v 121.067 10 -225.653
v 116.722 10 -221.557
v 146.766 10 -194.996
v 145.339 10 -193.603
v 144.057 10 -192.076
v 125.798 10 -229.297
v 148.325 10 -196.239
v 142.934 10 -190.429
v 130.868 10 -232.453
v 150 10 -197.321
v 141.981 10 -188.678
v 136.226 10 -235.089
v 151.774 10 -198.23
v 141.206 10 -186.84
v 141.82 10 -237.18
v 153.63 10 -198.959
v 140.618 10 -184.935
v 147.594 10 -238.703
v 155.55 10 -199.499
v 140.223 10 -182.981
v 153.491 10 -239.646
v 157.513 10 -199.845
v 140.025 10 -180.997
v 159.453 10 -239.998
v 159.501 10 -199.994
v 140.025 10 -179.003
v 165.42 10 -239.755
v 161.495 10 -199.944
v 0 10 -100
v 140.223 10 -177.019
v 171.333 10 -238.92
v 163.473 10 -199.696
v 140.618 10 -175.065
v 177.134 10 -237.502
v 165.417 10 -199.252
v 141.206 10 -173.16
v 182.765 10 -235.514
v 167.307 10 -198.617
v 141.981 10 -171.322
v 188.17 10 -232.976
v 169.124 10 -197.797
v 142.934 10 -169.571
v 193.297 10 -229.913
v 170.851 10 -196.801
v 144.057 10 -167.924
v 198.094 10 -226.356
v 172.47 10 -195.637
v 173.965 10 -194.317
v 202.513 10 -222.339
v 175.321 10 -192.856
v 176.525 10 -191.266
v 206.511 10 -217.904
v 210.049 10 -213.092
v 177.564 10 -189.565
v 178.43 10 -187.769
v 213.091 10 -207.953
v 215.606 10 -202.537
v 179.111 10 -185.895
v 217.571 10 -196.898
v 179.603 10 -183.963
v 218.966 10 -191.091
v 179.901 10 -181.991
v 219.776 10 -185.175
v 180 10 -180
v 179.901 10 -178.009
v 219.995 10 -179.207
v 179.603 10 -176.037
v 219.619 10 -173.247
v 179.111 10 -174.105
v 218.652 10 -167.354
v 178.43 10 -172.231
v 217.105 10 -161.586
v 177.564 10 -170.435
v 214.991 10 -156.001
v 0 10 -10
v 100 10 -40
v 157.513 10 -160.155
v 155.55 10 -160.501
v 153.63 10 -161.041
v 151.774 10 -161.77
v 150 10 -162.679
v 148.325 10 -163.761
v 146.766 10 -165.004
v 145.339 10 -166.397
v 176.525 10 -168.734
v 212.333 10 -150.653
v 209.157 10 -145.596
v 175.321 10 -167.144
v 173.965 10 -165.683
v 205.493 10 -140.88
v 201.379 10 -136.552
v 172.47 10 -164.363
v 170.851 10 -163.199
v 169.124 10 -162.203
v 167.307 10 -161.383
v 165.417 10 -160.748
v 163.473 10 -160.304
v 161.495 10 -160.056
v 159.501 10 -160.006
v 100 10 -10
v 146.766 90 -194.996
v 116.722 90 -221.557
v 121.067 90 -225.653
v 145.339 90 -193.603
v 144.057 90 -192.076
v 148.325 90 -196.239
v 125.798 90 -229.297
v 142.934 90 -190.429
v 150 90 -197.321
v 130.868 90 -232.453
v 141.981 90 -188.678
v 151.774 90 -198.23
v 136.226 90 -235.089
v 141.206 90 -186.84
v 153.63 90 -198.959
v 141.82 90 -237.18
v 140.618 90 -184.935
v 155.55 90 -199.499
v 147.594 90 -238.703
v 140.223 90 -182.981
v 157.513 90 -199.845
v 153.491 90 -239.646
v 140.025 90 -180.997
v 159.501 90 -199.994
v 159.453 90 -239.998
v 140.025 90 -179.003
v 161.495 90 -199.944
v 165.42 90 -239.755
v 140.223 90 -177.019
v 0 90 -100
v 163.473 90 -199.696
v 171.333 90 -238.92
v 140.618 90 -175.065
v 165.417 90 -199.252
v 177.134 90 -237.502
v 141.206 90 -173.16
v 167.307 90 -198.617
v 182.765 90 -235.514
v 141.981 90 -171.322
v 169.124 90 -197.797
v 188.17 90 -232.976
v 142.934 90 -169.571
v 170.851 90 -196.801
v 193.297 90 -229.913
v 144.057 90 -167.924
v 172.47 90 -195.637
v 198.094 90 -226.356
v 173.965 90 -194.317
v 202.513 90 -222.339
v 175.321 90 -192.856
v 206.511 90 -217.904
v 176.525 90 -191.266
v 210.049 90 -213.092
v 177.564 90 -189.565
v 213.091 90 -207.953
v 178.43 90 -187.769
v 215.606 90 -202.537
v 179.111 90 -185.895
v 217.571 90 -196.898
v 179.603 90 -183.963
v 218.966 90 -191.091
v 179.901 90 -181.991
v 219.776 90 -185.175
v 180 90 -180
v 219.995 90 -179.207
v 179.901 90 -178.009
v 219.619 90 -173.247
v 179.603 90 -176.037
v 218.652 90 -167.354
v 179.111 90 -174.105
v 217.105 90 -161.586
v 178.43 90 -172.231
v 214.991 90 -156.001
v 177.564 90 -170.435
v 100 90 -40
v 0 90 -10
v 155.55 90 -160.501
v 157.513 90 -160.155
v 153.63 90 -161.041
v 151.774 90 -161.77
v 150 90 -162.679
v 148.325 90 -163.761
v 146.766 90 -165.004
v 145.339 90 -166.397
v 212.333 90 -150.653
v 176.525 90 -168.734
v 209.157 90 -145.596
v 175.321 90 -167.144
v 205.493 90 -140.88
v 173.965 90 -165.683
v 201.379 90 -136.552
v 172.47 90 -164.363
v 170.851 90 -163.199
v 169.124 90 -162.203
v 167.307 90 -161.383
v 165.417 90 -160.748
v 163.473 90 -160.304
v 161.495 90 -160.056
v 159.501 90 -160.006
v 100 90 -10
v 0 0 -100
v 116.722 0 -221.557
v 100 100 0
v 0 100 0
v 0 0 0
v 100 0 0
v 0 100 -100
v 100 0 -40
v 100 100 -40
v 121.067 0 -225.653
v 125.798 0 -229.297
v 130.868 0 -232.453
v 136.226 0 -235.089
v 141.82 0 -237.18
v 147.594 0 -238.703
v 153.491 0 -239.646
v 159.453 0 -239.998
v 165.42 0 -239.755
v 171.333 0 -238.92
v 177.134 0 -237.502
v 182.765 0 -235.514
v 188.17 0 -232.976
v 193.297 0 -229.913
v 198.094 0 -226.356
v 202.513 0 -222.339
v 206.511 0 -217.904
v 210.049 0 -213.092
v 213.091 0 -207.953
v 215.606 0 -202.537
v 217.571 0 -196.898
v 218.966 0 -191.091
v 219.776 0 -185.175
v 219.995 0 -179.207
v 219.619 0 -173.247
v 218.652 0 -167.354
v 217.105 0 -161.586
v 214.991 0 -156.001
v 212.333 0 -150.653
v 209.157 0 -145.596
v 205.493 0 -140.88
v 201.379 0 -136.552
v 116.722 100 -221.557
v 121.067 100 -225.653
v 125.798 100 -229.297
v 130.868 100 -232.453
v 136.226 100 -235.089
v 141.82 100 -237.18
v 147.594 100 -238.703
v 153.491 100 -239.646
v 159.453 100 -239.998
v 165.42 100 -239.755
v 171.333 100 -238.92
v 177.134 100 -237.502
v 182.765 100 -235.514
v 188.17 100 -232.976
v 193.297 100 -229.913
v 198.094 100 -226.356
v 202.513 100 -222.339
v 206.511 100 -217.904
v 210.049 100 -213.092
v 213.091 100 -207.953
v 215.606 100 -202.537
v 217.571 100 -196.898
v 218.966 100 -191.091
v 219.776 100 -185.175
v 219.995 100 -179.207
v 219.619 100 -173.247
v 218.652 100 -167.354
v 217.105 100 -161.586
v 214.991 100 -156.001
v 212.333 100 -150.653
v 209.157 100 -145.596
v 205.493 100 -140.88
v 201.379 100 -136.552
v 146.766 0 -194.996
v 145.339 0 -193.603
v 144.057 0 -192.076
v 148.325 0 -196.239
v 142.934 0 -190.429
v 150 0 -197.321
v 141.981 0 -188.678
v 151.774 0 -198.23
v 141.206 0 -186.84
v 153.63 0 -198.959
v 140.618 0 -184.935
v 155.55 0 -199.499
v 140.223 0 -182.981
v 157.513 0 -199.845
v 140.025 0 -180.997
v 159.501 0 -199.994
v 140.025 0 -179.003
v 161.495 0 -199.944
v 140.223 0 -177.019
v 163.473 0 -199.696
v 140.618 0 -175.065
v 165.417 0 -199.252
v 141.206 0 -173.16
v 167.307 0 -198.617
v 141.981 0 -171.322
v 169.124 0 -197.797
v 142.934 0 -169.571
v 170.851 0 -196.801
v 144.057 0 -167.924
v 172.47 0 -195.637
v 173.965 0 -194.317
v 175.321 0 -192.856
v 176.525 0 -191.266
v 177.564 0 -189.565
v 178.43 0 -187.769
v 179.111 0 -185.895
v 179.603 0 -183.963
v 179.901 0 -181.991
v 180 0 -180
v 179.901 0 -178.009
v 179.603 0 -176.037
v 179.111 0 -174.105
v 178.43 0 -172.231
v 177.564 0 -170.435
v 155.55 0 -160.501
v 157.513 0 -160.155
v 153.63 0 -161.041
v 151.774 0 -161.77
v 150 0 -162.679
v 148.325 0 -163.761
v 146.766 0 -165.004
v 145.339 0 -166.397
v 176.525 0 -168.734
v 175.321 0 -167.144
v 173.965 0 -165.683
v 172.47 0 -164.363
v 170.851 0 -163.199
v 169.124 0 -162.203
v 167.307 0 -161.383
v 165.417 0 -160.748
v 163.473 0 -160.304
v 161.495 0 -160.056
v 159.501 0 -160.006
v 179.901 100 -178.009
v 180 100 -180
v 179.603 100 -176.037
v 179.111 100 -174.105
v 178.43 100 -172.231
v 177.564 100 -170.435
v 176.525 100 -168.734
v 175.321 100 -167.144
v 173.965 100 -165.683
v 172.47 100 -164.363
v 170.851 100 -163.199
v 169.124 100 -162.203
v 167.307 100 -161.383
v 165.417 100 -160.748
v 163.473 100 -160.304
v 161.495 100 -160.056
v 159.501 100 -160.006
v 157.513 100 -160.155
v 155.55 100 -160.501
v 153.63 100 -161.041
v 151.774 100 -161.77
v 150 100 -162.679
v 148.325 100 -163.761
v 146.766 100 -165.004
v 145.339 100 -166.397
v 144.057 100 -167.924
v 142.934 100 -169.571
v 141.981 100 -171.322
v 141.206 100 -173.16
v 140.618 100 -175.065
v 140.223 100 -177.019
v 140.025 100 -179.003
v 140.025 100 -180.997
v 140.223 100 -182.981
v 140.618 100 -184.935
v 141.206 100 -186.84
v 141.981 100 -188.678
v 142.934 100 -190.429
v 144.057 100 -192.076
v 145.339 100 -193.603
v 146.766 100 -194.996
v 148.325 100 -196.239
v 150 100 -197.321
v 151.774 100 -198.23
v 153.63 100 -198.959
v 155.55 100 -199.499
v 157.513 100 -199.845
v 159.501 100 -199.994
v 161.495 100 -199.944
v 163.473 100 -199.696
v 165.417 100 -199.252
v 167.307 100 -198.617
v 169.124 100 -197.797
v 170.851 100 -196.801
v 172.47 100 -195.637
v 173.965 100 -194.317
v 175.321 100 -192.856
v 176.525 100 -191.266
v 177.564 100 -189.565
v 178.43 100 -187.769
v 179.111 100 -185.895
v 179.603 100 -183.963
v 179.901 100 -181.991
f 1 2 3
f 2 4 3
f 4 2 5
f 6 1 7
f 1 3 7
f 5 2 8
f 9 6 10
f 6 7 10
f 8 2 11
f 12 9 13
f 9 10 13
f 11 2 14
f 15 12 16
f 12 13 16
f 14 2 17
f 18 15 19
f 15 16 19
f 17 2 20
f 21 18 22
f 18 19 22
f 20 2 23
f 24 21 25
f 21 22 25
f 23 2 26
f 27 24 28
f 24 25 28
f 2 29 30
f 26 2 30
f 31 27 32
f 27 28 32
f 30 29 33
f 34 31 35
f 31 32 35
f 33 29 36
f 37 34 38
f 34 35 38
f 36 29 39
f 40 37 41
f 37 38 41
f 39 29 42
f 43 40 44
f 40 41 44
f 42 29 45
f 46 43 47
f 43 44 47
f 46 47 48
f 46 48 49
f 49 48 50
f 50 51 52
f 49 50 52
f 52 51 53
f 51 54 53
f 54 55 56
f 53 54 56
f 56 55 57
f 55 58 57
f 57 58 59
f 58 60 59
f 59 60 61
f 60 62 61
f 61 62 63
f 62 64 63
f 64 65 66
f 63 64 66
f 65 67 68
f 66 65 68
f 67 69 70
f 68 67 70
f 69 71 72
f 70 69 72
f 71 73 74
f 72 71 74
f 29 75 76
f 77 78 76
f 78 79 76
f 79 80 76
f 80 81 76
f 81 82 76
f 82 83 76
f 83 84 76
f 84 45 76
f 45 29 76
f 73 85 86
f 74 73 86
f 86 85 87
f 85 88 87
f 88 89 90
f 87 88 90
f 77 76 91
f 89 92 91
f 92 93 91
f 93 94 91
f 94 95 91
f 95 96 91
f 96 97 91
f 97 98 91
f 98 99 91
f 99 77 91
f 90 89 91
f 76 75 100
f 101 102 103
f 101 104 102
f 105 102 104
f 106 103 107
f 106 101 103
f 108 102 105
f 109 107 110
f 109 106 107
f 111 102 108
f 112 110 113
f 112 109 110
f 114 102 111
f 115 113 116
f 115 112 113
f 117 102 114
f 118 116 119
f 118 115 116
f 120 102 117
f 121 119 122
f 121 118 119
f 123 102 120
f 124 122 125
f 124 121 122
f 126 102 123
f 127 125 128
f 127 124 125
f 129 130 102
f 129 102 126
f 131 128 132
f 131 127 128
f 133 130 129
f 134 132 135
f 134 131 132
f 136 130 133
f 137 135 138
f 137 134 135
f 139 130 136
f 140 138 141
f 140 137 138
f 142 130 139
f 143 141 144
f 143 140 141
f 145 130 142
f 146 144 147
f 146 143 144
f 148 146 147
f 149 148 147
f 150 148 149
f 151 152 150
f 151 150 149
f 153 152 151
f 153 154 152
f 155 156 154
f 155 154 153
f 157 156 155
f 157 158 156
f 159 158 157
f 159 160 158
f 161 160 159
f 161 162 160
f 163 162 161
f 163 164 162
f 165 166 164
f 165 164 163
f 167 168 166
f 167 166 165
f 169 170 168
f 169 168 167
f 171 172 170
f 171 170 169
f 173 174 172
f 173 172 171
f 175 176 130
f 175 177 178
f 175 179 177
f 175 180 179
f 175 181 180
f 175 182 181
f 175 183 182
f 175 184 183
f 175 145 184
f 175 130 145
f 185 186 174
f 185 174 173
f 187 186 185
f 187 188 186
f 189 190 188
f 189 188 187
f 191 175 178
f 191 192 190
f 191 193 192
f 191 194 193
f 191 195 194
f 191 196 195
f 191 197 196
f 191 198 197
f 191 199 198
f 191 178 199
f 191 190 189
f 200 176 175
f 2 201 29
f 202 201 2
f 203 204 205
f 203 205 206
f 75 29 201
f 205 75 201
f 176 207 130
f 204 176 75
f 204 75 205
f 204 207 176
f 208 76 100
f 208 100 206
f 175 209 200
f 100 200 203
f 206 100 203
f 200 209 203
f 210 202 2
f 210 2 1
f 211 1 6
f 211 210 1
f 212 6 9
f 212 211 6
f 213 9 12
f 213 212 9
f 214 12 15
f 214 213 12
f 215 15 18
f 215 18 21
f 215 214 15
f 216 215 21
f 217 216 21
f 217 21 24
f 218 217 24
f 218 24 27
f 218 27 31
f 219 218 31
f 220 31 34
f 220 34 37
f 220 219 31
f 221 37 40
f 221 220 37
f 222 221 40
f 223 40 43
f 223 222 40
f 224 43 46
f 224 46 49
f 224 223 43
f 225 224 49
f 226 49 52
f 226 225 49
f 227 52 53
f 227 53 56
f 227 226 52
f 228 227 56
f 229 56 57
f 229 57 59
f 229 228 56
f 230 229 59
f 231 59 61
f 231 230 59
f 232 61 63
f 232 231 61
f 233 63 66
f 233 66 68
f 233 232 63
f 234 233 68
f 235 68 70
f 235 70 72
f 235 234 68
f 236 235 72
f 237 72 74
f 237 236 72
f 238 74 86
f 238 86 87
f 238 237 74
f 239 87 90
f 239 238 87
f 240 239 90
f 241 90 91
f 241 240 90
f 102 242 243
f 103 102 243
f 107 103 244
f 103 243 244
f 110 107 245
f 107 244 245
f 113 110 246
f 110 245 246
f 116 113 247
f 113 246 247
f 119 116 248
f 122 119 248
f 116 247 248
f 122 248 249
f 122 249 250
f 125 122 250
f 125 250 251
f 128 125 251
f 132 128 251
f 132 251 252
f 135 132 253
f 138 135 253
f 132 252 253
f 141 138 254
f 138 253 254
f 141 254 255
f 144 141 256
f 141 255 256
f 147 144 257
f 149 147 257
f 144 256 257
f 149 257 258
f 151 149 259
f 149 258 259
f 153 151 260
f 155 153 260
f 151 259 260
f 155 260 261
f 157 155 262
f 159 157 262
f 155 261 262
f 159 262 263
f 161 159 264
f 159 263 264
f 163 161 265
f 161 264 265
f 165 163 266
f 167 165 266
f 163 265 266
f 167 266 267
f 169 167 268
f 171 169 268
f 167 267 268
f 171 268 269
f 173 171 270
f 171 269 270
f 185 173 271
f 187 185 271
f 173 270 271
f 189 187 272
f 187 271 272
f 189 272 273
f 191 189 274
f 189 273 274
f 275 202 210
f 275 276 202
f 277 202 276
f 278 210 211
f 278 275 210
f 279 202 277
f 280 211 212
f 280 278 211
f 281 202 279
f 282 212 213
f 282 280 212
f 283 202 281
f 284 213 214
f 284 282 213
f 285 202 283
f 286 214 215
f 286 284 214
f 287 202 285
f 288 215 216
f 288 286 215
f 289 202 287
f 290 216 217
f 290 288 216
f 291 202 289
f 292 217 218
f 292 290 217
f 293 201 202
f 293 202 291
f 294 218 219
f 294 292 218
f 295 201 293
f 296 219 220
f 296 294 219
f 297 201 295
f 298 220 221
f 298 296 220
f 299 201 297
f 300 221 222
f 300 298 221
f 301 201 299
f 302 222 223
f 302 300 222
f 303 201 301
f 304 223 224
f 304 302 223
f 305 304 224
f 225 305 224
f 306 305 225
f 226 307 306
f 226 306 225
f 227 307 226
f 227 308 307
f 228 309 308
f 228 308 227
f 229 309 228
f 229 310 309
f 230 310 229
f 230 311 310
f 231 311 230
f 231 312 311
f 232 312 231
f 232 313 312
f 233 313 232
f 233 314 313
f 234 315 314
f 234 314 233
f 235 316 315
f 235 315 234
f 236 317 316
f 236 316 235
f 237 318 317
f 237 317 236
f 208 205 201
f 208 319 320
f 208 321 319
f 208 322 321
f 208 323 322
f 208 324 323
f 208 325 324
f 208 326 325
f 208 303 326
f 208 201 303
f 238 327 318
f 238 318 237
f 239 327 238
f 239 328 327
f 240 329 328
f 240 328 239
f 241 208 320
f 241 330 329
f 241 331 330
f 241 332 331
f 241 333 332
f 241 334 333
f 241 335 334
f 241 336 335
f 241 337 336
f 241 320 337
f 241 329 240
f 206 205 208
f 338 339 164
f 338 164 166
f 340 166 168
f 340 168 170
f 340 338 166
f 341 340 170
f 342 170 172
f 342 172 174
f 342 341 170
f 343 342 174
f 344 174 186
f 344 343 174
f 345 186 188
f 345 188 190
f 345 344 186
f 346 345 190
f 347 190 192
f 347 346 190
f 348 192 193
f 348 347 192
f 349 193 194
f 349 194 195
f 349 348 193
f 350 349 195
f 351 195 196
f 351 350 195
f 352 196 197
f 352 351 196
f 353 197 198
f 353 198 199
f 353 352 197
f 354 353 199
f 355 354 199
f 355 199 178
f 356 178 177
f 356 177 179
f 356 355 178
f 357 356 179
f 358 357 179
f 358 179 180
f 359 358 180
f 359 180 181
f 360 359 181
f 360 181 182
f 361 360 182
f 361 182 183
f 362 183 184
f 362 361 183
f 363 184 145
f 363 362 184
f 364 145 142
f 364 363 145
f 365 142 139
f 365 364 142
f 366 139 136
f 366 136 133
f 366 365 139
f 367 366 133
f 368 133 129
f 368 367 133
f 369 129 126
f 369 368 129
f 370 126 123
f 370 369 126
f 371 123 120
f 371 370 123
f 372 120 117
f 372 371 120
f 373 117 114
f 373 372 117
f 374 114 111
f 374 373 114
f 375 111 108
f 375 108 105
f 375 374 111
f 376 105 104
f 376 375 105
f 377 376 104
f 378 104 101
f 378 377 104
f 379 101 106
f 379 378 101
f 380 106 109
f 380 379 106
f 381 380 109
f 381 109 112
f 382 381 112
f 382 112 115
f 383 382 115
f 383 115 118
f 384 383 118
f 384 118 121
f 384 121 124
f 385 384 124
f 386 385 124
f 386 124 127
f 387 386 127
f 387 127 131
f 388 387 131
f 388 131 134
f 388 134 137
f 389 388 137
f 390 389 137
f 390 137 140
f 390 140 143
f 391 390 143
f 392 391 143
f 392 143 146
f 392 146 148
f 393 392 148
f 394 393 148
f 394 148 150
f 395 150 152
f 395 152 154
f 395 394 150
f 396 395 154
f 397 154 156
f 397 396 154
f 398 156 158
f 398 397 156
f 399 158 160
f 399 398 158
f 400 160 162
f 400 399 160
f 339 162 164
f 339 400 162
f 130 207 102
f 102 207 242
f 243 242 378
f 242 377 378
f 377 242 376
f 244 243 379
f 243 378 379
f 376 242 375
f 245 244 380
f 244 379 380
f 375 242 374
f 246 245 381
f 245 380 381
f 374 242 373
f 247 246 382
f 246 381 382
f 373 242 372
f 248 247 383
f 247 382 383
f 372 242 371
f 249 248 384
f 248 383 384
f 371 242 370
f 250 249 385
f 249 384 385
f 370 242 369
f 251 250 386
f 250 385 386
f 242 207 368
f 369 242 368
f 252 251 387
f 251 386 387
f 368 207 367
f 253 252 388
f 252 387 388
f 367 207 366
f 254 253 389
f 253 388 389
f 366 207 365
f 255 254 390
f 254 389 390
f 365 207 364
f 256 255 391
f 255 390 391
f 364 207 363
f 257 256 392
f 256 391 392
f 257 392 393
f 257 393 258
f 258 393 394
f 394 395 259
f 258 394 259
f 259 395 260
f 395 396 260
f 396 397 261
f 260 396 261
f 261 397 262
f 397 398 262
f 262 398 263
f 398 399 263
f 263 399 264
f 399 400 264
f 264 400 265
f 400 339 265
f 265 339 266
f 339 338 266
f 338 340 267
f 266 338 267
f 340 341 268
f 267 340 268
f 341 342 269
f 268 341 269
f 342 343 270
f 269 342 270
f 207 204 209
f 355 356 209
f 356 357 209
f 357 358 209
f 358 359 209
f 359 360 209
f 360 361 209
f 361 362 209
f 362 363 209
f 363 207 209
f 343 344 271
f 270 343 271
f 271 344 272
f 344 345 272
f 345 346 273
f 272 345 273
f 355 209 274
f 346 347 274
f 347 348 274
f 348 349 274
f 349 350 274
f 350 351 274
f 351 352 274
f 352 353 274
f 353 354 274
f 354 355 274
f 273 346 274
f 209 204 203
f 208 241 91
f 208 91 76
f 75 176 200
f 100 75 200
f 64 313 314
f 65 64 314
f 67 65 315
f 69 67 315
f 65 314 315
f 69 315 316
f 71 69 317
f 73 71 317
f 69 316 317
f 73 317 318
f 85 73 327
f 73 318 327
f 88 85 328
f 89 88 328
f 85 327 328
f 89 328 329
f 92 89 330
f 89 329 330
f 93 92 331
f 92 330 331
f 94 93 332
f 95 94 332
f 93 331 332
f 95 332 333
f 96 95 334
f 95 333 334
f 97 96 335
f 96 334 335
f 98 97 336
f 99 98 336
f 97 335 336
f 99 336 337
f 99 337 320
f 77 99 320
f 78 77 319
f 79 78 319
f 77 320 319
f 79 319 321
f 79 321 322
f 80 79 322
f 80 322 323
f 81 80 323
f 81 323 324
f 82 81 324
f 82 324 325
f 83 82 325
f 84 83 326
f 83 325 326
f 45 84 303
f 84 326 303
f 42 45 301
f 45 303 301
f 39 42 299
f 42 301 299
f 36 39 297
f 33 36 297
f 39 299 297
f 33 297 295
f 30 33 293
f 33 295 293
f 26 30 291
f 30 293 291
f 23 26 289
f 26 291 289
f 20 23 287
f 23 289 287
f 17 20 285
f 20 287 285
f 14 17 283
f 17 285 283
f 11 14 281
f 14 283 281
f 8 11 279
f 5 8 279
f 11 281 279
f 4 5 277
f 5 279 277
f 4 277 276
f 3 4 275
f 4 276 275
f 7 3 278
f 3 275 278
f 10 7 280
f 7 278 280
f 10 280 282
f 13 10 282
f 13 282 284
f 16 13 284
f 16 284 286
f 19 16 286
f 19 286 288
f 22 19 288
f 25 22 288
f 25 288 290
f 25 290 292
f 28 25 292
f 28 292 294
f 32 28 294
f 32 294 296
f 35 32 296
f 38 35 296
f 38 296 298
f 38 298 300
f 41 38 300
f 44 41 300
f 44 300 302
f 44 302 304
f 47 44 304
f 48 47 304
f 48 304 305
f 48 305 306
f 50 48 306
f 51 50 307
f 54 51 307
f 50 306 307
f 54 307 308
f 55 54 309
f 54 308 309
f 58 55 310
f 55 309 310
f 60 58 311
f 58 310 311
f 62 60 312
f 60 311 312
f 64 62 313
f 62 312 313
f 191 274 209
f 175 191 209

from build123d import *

# Parameters (mm, degrees)
F0_R     = 20
F1_DEPTH = 10
F4_W     = 100
F4_H     = 10
F5_DEPTH = 80


with BuildPart() as f1:
    # F0 (on Front) → F1 (new body)
    with BuildSketch(Plane.XZ):
        with BuildLine():
            Line((100, 0), (0, 0))
            Line((0, 0), (0, -100))
            Line((0, -100), (116.7215506805, -221.5568986391))
            ThreePointArc((116.7215506805, -221.5568986391), (202.5131933075, -222.3394425423), (201.3793103448, -136.5517241379))
            Line((201.3793103448, -136.5517241379), (100, -40))
            Line((100, -40), (100, 0))
        make_face()
        with Locations((160, -180)):
            Circle(F0_R, mode=Mode.SUBTRACT)
    extrude(amount=-F1_DEPTH)


with BuildPart() as f3_1:
    # F3: instance of F1
    add(f1.part.mirror(Plane.XZ.offset(-50)))


with BuildPart() as f1_1:
    add(f1.part)

    add(f3_1.part)  # F5 merges F3_1
    # F4 (on face) → F5 (join, through all)
    with BuildSketch(Plane.XZ.offset(-90)):
        with Locations((50, -5)):
            Rectangle(F4_W, F4_H)
    extrude(amount=F5_DEPTH)


solid = f1_1.part
